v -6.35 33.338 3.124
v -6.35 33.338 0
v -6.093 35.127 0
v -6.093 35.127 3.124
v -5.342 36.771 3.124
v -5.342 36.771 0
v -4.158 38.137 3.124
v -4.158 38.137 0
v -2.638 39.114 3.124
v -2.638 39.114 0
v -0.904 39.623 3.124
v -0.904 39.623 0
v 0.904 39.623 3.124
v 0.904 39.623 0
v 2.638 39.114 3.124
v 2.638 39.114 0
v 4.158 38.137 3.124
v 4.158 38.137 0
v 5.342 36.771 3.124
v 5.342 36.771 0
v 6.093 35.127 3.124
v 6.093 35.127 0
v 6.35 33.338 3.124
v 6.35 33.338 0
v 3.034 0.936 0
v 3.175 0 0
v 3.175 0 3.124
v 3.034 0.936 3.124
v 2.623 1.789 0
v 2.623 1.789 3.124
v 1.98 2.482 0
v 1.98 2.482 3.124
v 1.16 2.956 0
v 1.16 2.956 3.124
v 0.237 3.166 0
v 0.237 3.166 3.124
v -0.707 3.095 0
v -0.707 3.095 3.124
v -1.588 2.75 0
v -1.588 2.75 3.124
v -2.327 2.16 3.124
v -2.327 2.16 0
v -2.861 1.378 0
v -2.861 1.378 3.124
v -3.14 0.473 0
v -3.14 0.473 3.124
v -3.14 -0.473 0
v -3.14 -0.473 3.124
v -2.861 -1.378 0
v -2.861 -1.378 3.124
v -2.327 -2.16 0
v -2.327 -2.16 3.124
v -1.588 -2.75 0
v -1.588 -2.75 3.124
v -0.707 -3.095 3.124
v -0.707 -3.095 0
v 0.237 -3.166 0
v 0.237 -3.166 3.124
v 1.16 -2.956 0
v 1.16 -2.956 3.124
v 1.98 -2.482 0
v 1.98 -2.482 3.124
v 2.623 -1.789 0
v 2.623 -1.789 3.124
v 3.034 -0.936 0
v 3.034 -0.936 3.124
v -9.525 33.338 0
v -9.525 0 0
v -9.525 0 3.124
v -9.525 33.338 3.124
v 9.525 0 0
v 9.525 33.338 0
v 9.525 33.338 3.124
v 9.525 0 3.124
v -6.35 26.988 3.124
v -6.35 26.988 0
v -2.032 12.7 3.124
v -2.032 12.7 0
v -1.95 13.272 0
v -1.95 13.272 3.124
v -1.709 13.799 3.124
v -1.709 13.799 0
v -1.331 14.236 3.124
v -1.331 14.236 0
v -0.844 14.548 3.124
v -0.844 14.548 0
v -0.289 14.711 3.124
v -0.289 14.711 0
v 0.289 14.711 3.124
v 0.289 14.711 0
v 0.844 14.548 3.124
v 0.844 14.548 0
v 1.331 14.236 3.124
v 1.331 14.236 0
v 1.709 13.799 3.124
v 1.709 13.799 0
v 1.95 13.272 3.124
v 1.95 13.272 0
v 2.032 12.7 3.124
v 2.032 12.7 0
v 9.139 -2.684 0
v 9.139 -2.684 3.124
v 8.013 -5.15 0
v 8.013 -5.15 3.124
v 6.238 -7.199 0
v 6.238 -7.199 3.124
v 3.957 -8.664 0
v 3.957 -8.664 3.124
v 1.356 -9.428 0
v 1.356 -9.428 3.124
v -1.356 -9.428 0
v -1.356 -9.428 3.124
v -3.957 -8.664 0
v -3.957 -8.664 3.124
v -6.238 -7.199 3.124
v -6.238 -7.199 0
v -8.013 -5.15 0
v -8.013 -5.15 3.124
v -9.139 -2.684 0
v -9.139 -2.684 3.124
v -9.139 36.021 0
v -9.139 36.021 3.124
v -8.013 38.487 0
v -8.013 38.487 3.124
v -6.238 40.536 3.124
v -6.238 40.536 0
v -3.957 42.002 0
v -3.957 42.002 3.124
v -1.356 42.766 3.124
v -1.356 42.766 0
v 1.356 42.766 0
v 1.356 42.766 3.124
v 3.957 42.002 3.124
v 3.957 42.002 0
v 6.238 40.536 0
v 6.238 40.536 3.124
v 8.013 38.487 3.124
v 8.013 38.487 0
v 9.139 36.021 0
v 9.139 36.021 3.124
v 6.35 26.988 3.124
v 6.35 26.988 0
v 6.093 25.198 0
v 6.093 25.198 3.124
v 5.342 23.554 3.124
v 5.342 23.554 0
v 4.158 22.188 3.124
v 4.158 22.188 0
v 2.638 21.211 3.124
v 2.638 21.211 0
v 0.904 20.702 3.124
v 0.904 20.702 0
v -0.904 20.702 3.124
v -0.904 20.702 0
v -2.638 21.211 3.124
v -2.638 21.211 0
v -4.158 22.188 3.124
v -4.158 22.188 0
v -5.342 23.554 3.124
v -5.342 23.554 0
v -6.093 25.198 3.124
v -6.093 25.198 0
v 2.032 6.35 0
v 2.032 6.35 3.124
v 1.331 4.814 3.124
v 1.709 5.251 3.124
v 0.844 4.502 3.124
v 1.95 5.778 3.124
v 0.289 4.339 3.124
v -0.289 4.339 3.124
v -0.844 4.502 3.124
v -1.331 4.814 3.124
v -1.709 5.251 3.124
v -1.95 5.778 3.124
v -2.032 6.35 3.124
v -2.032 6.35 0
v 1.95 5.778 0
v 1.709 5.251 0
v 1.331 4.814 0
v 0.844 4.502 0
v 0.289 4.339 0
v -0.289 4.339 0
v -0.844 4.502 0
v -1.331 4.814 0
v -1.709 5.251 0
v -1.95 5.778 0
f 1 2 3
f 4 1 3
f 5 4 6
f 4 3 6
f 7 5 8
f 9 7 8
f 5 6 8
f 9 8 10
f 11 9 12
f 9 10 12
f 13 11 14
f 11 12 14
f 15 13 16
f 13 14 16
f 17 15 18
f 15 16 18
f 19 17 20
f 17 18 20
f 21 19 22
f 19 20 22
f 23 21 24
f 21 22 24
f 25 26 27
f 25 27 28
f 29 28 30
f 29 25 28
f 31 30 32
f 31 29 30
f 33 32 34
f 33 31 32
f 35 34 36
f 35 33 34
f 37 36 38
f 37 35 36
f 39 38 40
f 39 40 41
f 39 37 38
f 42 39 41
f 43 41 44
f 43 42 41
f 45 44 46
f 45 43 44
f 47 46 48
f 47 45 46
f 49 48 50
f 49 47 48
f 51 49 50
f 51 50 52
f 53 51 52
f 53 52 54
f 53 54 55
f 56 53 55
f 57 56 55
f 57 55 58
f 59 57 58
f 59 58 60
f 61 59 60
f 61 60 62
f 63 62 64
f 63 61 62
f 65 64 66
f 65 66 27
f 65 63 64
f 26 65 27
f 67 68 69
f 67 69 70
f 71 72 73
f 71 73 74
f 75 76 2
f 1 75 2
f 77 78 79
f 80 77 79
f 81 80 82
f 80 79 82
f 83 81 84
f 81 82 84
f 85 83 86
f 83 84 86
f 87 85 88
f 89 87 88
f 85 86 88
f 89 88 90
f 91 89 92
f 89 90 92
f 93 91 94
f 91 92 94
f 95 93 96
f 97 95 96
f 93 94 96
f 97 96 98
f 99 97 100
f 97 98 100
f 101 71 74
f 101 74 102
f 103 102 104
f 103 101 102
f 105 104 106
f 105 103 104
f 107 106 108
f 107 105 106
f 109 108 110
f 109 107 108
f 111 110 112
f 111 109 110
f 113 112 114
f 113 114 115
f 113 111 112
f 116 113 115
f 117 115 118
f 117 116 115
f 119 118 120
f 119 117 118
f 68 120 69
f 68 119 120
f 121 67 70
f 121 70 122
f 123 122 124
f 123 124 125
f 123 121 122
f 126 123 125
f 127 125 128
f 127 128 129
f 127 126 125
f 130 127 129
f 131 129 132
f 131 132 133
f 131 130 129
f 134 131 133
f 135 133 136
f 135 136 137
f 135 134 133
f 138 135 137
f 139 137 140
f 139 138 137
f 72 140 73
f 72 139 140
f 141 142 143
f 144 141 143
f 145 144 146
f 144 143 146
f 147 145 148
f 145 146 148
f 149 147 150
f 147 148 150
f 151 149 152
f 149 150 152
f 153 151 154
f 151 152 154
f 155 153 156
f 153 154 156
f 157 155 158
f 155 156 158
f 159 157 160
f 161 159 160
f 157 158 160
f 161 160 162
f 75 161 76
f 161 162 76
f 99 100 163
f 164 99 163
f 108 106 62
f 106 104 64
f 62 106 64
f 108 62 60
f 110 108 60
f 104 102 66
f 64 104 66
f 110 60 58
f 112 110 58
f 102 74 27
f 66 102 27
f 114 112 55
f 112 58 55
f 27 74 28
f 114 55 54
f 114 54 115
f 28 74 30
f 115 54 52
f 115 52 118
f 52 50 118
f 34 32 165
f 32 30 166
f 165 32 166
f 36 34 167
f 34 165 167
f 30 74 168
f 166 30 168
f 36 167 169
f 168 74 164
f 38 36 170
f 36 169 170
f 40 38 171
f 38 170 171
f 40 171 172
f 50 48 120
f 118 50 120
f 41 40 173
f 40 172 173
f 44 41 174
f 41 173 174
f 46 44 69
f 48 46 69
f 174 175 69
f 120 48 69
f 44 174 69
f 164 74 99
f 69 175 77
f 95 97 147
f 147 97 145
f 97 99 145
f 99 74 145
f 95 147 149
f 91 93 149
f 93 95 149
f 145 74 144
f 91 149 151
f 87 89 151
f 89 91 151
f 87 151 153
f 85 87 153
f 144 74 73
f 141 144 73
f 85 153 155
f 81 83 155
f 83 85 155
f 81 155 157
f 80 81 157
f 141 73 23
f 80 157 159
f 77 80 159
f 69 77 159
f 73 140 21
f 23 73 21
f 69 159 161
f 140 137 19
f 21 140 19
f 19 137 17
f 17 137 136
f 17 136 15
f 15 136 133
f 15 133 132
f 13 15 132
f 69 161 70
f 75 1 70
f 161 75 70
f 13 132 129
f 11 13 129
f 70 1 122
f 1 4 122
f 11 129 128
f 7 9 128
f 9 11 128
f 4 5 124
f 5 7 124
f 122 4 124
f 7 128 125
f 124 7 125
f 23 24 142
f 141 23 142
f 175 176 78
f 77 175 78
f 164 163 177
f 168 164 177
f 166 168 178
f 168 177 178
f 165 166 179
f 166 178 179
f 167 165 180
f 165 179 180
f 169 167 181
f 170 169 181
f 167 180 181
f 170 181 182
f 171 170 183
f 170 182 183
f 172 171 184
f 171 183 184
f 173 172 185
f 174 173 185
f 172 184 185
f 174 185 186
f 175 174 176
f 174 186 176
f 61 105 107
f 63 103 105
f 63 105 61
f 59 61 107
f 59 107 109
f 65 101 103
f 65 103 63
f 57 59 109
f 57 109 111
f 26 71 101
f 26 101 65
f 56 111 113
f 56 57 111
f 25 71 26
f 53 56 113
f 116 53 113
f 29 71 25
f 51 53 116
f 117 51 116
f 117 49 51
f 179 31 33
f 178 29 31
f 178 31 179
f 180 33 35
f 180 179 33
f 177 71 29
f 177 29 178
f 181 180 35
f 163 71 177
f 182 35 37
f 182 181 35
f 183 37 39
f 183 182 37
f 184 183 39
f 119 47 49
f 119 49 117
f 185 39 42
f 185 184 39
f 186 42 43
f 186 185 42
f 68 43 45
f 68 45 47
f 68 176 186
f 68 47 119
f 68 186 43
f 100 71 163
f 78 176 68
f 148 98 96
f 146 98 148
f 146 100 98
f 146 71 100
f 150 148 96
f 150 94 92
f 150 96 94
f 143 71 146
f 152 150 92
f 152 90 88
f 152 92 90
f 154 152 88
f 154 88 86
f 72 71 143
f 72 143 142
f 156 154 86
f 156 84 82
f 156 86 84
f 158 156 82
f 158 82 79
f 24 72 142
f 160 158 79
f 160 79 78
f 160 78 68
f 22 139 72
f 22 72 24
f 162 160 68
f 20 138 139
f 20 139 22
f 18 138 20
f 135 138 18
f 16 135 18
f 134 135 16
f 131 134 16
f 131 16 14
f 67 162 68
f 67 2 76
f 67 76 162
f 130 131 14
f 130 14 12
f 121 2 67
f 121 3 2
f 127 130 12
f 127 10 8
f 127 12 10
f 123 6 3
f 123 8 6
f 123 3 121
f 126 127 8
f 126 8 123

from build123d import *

# Parameters (mm, degrees)
CROQUIS1_R              = 3.175
SALIENTE_EXTRUIR1_DEPTH = 3.1242


with BuildPart() as part:
    # Croquis1 → Saliente-Extruir1 (new body)
    with BuildSketch(Plane.XY):
        with BuildLine():
            Line((-9.525, 0), (-9.525, 33.3375))
            ThreePointArc((-9.525, 33.3375), (0, 42.8625), (9.525, 33.3375))
            Line((9.525, 33.3375), (9.525, 0))
            ThreePointArc((9.525, 0), (0, -9.525), (-9.525, 0))
        make_face()
        Circle(CROQUIS1_R, mode=Mode.SUBTRACT)
        with BuildLine():
            Line((-2.032, 6.35), (-2.032, 12.7))
            ThreePointArc((-2.032, 12.7), (0, 14.732), (2.032, 12.7))
            Line((2.032, 12.7), (2.032, 6.35))
            ThreePointArc((2.032, 6.35), (0, 4.318), (-2.032, 6.35))
        make_face(mode=Mode.SUBTRACT)
        with BuildLine():
            Line((6.35, 33.3375), (6.35, 26.9875))
            ThreePointArc((6.35, 26.9875), (0, 20.6375), (-6.35, 26.9875))
            Line((-6.35, 26.9875), (-6.35, 33.3375))
            ThreePointArc((-6.35, 33.3375), (0, 39.6875), (6.35, 33.3375))
        make_face(mode=Mode.SUBTRACT)
    extrude(amount=SALIENTE_EXTRUIR1_DEPTH)


solid = part.part
